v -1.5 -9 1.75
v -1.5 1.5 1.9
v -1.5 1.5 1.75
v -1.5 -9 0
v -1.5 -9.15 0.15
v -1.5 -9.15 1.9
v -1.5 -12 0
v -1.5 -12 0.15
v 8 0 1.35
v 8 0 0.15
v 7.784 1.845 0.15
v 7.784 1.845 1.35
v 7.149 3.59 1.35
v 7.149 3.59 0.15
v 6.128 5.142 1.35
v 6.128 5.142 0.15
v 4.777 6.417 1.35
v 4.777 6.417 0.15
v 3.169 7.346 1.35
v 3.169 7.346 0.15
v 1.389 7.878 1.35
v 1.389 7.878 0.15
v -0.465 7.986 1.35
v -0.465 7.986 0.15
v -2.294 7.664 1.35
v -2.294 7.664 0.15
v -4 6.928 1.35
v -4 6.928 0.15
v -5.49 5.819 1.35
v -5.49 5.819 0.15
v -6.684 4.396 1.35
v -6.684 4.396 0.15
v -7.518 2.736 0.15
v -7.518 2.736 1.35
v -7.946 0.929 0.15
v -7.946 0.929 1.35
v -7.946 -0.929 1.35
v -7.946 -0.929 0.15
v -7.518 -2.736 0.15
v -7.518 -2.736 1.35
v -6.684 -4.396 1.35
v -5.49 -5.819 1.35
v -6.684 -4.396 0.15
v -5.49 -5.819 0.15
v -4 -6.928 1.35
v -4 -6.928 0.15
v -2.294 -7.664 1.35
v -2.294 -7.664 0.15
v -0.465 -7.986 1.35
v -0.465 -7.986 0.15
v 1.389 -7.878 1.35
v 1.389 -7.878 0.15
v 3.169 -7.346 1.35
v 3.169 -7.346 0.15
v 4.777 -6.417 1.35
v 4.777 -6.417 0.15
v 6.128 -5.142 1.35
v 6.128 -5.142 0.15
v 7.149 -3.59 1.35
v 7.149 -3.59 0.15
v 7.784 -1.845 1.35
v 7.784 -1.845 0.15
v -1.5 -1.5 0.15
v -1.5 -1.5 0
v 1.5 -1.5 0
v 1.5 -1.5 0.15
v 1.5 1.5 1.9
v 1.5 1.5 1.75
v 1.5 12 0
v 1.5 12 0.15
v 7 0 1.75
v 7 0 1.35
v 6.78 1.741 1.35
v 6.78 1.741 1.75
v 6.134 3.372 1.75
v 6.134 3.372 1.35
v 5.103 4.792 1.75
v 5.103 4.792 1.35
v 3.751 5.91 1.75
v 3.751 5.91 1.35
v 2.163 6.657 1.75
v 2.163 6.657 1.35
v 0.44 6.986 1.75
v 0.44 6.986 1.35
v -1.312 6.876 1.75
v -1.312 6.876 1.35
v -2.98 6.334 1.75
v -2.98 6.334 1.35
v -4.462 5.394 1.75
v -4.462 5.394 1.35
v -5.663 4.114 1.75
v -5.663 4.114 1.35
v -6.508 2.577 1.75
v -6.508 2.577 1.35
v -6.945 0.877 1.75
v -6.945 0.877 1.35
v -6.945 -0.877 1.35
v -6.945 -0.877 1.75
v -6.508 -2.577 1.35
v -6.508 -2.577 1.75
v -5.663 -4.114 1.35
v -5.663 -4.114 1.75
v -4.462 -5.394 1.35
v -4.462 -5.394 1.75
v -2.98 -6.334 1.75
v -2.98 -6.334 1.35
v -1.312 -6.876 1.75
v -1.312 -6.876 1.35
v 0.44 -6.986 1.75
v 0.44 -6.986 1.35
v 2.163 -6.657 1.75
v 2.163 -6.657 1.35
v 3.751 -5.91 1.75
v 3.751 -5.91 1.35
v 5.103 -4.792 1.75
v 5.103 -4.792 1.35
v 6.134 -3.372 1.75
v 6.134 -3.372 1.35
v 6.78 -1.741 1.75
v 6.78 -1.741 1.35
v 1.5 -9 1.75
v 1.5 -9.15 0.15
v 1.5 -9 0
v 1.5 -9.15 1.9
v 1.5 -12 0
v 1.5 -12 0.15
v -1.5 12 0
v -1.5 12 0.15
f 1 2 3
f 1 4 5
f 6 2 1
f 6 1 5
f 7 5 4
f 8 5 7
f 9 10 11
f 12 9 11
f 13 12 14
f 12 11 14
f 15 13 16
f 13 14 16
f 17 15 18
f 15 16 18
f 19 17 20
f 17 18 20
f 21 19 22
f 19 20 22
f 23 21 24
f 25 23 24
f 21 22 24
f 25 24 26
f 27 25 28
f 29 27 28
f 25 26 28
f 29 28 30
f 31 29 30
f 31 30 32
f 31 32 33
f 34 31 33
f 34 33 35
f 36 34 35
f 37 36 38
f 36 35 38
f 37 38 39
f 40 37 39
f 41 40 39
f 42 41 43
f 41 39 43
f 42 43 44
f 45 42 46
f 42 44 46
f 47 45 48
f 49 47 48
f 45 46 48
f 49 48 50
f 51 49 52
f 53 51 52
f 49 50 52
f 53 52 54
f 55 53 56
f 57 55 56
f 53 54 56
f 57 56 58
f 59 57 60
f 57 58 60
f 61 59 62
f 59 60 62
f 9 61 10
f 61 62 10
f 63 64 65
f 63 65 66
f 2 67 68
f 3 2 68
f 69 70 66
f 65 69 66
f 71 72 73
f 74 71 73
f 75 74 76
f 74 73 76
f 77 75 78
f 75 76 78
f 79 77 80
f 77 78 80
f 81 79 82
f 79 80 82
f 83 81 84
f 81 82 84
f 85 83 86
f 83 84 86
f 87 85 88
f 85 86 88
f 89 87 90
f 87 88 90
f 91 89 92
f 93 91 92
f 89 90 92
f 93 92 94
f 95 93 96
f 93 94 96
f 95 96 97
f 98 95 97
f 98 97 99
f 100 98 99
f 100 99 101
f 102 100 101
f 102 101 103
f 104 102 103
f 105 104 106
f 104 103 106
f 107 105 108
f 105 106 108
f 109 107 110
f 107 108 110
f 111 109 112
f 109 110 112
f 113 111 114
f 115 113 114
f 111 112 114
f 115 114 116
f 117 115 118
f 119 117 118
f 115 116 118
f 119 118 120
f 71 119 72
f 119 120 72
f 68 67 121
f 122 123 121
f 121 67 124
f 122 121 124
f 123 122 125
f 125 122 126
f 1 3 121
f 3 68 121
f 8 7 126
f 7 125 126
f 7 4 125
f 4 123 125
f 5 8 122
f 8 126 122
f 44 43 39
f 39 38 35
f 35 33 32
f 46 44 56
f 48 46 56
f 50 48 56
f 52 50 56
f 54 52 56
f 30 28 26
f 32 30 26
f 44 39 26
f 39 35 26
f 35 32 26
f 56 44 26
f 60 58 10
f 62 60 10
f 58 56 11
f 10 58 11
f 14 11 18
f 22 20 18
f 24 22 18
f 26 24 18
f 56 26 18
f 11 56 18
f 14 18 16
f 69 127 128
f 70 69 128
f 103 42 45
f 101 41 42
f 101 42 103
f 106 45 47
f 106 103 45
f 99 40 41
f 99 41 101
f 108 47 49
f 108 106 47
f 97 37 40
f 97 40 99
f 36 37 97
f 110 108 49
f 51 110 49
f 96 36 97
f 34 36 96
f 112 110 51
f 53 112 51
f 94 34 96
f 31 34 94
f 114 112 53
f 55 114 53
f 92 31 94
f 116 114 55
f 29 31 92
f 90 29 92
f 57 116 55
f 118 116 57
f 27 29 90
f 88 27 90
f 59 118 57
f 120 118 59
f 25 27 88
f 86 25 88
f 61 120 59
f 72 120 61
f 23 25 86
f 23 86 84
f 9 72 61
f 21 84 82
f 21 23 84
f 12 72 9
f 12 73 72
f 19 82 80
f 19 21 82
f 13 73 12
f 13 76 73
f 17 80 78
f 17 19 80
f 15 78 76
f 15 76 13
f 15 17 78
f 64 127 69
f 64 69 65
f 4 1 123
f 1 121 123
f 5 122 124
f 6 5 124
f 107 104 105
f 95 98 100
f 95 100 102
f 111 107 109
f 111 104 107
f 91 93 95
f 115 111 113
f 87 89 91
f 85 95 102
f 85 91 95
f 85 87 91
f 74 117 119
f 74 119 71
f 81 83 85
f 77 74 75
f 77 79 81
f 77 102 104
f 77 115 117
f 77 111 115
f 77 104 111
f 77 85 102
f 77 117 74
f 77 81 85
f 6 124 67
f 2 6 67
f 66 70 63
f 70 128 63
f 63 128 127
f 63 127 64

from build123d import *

# Parameters (mm, degrees)
SKETCH_R                = 8
PAD_DEPTH               = 1.2
SKETCH001_R             = 7
PAD001_DEPTH            = 0.4
SKETCH003_W             = 13.5
SKETCH003_H             = 0.15
PAD003_DEPTH            = 1.5
BODY001_PLACEMENT_ANGLE = 180


with BuildPart() as battery:
    # Sketch (on XY_Plane of Origin) → Pad (new body)
    with BuildSketch(Plane.XY.offset(0.15)):
        Circle(SKETCH_R)
    extrude(amount=PAD_DEPTH)

    # Sketch001 (on Face3 of Pad) → Pad001 (join)
    with BuildSketch(Plane.XY.offset(1.35)):
        Circle(SKETCH001_R)
    extrude(amount=PAD001_DEPTH)


with BuildPart() as tabs:
    # Sketch003 (on YZ_Plane of Origin) → Pad003 (new body, symmetric)
    with BuildSketch(Plane.YZ):
        Polygon((-1.5, 1.9), (-1.5, 1.75), (9, 1.75), (9, 0), (12, 0), (12, 0.15), (9.15, 0.15), (9.15, 1.9), align=None)
        with Locations((-5.25, 0.075)):
            Rectangle(SKETCH003_W, SKETCH003_H)
    extrude(amount=PAD003_DEPTH, both=True)


with BuildPart() as tabs_1:
    # Body001 placement: moved
    add(tabs.part.rotate(Axis((0, 0, 0), (0, 0, 1)), BODY001_PLACEMENT_ANGLE))


solid = Compound([battery.part, tabs_1.part])
